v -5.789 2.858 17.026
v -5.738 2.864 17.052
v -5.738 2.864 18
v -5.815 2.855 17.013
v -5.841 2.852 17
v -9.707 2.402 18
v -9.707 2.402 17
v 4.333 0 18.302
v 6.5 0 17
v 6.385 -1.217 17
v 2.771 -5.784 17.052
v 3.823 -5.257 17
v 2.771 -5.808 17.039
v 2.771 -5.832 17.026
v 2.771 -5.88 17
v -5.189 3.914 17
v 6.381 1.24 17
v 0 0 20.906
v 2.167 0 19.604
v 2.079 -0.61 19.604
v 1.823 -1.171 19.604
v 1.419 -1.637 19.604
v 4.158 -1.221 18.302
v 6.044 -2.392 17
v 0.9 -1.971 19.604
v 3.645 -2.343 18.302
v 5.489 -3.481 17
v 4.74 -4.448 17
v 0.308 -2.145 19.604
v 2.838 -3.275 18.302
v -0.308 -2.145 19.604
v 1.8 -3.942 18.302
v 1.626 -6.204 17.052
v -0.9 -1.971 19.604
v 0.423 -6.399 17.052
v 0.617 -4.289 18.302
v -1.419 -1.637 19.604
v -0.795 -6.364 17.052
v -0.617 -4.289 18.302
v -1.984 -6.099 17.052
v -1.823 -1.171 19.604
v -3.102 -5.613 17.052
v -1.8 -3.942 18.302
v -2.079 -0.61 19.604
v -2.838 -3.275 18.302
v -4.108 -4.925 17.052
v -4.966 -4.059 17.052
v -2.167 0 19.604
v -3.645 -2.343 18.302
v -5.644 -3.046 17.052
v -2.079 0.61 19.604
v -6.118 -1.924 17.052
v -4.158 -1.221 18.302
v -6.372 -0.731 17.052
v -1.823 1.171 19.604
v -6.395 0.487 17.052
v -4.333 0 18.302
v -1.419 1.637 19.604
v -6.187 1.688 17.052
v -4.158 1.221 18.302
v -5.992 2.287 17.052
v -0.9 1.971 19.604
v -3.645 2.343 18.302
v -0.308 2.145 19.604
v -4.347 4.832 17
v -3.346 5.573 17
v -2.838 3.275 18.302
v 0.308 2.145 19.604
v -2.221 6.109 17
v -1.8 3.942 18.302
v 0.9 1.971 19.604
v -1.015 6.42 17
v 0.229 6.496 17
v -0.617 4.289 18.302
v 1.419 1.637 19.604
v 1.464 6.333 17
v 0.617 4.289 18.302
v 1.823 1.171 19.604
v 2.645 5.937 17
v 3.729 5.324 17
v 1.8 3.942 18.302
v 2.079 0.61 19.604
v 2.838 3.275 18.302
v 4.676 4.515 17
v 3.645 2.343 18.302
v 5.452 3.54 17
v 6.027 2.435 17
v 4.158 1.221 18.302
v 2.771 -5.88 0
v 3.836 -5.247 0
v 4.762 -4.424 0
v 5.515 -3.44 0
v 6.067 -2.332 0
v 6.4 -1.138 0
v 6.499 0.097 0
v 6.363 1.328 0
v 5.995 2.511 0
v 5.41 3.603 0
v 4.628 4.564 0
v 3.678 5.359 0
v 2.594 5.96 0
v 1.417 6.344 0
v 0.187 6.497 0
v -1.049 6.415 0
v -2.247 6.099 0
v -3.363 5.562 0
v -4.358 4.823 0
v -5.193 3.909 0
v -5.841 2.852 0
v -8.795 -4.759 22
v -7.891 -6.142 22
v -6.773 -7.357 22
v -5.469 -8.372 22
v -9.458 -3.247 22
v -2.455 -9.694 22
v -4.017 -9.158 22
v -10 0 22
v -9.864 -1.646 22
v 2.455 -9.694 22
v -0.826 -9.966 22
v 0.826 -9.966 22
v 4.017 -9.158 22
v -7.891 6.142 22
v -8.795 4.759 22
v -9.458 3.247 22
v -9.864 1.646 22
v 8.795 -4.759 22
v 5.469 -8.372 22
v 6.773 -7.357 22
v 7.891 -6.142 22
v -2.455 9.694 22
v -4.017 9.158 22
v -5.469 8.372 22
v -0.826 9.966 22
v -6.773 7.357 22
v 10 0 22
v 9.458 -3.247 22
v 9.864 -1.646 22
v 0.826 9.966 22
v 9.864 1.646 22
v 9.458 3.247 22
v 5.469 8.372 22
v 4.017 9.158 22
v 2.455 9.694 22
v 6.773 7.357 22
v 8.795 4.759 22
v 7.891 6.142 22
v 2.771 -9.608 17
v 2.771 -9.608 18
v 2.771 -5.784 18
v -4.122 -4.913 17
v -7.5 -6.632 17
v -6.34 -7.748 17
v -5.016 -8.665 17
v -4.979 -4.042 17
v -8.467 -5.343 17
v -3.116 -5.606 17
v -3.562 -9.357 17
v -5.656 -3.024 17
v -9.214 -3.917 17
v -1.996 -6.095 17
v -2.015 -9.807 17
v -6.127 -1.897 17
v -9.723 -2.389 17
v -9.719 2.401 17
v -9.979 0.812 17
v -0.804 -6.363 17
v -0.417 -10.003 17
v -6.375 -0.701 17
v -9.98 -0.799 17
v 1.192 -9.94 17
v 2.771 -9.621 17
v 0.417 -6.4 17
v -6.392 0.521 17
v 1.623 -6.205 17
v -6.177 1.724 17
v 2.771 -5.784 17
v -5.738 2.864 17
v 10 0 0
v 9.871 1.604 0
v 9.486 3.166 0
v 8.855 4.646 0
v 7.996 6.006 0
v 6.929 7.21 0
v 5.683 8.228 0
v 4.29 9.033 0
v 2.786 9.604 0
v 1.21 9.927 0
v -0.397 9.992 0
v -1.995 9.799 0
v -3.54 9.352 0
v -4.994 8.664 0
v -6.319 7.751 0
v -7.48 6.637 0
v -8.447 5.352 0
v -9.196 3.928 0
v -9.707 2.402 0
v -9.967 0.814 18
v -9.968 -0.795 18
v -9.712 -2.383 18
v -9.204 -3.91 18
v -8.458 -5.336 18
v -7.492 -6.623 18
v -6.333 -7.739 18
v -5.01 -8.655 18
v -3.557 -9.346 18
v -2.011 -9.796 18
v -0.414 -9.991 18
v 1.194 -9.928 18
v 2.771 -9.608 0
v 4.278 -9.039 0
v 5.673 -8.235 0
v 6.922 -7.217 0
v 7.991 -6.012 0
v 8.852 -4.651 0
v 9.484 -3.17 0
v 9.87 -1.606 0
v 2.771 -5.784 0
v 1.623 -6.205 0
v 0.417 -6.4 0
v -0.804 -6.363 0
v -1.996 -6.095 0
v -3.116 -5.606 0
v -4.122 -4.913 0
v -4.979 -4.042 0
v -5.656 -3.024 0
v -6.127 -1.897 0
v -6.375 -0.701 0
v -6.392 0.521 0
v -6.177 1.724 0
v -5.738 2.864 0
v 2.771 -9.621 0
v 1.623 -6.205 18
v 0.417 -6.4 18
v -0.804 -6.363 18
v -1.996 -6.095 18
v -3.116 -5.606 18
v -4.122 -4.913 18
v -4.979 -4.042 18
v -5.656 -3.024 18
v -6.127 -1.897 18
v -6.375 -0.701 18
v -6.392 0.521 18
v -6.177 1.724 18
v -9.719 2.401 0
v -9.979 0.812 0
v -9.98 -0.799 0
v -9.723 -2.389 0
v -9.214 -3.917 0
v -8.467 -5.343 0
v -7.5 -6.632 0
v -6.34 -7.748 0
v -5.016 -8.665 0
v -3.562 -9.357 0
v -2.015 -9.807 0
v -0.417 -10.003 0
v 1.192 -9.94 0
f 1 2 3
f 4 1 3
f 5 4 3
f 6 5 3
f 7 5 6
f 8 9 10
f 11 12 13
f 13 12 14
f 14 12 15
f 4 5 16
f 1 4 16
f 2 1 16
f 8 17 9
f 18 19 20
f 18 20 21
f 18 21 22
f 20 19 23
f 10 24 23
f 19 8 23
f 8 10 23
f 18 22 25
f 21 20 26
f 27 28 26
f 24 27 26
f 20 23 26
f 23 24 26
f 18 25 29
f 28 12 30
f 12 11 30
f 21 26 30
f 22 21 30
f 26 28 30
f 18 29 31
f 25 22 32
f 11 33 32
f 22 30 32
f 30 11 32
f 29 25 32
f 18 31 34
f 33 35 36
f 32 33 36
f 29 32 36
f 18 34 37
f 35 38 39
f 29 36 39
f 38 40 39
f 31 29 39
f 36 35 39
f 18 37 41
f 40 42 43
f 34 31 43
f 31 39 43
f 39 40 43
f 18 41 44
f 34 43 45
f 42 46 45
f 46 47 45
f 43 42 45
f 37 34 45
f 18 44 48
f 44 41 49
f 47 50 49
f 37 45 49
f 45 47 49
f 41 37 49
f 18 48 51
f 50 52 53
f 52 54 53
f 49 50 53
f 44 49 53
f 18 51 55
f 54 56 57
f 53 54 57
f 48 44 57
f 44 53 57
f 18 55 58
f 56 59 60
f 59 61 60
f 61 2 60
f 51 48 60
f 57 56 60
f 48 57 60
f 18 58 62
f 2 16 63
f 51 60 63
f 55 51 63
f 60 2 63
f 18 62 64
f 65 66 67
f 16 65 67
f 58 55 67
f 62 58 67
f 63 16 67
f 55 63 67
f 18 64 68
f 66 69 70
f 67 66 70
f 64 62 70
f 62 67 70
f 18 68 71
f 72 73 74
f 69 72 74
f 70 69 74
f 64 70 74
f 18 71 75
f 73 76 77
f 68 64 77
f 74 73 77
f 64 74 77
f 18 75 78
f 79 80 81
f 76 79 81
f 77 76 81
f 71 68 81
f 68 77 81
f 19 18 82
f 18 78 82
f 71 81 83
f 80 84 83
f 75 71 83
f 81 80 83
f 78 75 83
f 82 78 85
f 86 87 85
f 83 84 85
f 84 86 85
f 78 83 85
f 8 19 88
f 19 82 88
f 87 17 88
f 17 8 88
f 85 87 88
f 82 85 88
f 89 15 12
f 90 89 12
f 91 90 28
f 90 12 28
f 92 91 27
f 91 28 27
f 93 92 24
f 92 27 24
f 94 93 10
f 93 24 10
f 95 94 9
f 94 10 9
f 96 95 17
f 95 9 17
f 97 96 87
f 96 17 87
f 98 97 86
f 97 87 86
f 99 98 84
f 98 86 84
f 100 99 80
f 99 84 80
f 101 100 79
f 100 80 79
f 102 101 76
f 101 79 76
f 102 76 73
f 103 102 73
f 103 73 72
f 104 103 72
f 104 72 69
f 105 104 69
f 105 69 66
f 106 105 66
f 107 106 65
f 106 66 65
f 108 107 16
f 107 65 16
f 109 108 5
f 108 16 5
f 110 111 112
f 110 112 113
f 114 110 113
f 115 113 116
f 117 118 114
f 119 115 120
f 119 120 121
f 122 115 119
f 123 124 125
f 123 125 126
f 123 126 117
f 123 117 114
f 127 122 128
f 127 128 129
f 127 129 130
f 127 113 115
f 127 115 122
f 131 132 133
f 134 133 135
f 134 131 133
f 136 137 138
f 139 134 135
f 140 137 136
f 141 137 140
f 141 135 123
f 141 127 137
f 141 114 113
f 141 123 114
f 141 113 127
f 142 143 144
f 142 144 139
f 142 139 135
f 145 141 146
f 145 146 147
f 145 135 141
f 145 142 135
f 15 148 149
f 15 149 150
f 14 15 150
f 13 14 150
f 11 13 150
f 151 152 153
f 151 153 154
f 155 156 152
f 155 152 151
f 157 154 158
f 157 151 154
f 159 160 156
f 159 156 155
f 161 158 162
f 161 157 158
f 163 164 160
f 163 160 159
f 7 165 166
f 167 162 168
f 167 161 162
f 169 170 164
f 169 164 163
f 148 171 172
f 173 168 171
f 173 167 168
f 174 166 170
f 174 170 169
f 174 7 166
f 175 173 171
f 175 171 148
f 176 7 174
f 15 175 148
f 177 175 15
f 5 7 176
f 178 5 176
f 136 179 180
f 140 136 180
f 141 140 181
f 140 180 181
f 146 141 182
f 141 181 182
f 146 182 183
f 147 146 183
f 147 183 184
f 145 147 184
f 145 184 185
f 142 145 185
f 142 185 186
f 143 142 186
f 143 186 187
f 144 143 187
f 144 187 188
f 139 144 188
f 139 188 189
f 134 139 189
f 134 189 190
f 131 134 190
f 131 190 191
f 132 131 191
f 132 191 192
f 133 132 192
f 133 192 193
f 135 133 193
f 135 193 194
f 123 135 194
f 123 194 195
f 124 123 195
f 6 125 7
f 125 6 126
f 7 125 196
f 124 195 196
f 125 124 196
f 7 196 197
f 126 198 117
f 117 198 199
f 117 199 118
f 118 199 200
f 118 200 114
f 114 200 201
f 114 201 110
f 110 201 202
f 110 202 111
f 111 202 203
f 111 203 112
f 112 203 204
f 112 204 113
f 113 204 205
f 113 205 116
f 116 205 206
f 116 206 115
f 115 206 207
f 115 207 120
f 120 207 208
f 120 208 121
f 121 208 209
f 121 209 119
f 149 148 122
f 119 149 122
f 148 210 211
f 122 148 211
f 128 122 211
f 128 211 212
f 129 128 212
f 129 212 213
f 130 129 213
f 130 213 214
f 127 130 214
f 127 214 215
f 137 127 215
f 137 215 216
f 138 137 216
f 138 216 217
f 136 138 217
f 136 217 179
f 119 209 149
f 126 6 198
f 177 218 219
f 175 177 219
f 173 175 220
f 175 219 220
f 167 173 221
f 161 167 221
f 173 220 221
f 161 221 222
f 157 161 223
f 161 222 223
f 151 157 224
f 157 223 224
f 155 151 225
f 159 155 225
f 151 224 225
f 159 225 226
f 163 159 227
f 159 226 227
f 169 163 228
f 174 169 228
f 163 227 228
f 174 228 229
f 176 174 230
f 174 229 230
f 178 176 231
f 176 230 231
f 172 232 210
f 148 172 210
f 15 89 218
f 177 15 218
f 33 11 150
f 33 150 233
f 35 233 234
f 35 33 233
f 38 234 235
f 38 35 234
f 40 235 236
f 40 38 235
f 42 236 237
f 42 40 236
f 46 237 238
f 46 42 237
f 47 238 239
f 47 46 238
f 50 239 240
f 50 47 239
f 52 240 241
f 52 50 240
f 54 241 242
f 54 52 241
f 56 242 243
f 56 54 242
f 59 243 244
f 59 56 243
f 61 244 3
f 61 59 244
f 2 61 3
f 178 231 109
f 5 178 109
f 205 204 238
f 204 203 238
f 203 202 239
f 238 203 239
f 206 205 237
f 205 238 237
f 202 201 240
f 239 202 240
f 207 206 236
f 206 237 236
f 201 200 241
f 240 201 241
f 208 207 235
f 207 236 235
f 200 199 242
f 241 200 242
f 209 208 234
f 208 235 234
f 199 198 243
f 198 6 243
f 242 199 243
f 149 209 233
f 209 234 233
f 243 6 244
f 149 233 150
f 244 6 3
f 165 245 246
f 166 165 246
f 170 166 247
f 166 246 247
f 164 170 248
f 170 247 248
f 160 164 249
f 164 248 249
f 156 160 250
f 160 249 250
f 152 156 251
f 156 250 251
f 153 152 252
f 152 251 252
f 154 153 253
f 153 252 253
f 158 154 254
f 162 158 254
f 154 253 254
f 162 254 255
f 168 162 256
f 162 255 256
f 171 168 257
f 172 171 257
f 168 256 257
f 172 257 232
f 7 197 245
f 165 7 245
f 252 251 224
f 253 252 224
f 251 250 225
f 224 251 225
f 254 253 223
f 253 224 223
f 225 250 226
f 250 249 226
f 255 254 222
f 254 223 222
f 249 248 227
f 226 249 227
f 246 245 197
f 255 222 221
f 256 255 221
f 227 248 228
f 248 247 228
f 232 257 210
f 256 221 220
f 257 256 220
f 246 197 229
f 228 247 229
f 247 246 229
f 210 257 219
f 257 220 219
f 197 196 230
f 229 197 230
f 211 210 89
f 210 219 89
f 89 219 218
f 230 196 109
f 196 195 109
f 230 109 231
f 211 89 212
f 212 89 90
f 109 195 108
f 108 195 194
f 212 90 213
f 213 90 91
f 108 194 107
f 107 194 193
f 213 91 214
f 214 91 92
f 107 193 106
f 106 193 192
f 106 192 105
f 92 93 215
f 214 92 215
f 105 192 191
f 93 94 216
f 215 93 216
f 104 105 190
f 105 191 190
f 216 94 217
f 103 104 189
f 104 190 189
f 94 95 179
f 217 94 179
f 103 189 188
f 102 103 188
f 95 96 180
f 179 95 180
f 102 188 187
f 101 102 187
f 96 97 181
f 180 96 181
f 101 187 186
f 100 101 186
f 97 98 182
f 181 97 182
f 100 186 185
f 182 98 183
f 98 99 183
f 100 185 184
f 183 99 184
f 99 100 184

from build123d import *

# Parameters (mm, degrees)
F0_R     = 10
F1_DEPTH = 22
F3_D     = 13
F3_DEPTH = 17
F3_TIP   = 3.9055940237
F5_DEPTH = 18
F6_DEPTH = 17


with BuildPart() as f1:
    # F0 (on Top) → F1 (new body)
    with BuildSketch(Plane.XY):
        Circle(F0_R)
    extrude(amount=F1_DEPTH)

    # F3
    with Locations(Plane(origin=(0, 0, 0), x_dir=(1, 0, 0), z_dir=(0, 0, -1))):
        with Locations((0, 0)):
            Hole(F3_D / 2, depth=F3_DEPTH)
            with Locations((0, 0, -(F3_DEPTH + F3_TIP / 2))):  # 118° drill point
                Cone(0, F3_D / 2, F3_TIP, mode=Mode.SUBTRACT)

    # F4 (on Top) → F5 (cut)
    with BuildSketch(Plane.XY):
        with BuildLine():
            Line((2.770723775, -9.6206208691), (2.770723775, -5.7840836234))
            ThreePointArc((2.770723775, -5.7840836234), (-4.5716731582, -4.4980371424), (-5.7383336819, 2.8642730588))
            Line((-5.7383336819, 2.8642730588), (-9.7194789065, 2.401038511))
            ThreePointArc((-9.7194789065, 2.401038511), (-6.9427208666, -7.2133129083), (2.770723775, -9.6206208691))
        make_face()
    extrude(amount=F5_DEPTH, mode=Mode.SUBTRACT)

    # F4 (on Top) → F6 (join)
    with BuildSketch(Plane.XY):
        with BuildLine():
            Line((2.770723775, -9.6206208691), (2.770723775, -5.7840836234))
            ThreePointArc((2.770723775, -5.7840836234), (-4.5716731582, -4.4980371424), (-5.7383336819, 2.8642730588))
            Line((-5.7383336819, 2.8642730588), (-9.7194789065, 2.401038511))
            ThreePointArc((-9.7194789065, 2.401038511), (-6.9427208666, -7.2133129083), (2.770723775, -9.6206208691))
        make_face()
    extrude(amount=F6_DEPTH)


solid = f1.part
